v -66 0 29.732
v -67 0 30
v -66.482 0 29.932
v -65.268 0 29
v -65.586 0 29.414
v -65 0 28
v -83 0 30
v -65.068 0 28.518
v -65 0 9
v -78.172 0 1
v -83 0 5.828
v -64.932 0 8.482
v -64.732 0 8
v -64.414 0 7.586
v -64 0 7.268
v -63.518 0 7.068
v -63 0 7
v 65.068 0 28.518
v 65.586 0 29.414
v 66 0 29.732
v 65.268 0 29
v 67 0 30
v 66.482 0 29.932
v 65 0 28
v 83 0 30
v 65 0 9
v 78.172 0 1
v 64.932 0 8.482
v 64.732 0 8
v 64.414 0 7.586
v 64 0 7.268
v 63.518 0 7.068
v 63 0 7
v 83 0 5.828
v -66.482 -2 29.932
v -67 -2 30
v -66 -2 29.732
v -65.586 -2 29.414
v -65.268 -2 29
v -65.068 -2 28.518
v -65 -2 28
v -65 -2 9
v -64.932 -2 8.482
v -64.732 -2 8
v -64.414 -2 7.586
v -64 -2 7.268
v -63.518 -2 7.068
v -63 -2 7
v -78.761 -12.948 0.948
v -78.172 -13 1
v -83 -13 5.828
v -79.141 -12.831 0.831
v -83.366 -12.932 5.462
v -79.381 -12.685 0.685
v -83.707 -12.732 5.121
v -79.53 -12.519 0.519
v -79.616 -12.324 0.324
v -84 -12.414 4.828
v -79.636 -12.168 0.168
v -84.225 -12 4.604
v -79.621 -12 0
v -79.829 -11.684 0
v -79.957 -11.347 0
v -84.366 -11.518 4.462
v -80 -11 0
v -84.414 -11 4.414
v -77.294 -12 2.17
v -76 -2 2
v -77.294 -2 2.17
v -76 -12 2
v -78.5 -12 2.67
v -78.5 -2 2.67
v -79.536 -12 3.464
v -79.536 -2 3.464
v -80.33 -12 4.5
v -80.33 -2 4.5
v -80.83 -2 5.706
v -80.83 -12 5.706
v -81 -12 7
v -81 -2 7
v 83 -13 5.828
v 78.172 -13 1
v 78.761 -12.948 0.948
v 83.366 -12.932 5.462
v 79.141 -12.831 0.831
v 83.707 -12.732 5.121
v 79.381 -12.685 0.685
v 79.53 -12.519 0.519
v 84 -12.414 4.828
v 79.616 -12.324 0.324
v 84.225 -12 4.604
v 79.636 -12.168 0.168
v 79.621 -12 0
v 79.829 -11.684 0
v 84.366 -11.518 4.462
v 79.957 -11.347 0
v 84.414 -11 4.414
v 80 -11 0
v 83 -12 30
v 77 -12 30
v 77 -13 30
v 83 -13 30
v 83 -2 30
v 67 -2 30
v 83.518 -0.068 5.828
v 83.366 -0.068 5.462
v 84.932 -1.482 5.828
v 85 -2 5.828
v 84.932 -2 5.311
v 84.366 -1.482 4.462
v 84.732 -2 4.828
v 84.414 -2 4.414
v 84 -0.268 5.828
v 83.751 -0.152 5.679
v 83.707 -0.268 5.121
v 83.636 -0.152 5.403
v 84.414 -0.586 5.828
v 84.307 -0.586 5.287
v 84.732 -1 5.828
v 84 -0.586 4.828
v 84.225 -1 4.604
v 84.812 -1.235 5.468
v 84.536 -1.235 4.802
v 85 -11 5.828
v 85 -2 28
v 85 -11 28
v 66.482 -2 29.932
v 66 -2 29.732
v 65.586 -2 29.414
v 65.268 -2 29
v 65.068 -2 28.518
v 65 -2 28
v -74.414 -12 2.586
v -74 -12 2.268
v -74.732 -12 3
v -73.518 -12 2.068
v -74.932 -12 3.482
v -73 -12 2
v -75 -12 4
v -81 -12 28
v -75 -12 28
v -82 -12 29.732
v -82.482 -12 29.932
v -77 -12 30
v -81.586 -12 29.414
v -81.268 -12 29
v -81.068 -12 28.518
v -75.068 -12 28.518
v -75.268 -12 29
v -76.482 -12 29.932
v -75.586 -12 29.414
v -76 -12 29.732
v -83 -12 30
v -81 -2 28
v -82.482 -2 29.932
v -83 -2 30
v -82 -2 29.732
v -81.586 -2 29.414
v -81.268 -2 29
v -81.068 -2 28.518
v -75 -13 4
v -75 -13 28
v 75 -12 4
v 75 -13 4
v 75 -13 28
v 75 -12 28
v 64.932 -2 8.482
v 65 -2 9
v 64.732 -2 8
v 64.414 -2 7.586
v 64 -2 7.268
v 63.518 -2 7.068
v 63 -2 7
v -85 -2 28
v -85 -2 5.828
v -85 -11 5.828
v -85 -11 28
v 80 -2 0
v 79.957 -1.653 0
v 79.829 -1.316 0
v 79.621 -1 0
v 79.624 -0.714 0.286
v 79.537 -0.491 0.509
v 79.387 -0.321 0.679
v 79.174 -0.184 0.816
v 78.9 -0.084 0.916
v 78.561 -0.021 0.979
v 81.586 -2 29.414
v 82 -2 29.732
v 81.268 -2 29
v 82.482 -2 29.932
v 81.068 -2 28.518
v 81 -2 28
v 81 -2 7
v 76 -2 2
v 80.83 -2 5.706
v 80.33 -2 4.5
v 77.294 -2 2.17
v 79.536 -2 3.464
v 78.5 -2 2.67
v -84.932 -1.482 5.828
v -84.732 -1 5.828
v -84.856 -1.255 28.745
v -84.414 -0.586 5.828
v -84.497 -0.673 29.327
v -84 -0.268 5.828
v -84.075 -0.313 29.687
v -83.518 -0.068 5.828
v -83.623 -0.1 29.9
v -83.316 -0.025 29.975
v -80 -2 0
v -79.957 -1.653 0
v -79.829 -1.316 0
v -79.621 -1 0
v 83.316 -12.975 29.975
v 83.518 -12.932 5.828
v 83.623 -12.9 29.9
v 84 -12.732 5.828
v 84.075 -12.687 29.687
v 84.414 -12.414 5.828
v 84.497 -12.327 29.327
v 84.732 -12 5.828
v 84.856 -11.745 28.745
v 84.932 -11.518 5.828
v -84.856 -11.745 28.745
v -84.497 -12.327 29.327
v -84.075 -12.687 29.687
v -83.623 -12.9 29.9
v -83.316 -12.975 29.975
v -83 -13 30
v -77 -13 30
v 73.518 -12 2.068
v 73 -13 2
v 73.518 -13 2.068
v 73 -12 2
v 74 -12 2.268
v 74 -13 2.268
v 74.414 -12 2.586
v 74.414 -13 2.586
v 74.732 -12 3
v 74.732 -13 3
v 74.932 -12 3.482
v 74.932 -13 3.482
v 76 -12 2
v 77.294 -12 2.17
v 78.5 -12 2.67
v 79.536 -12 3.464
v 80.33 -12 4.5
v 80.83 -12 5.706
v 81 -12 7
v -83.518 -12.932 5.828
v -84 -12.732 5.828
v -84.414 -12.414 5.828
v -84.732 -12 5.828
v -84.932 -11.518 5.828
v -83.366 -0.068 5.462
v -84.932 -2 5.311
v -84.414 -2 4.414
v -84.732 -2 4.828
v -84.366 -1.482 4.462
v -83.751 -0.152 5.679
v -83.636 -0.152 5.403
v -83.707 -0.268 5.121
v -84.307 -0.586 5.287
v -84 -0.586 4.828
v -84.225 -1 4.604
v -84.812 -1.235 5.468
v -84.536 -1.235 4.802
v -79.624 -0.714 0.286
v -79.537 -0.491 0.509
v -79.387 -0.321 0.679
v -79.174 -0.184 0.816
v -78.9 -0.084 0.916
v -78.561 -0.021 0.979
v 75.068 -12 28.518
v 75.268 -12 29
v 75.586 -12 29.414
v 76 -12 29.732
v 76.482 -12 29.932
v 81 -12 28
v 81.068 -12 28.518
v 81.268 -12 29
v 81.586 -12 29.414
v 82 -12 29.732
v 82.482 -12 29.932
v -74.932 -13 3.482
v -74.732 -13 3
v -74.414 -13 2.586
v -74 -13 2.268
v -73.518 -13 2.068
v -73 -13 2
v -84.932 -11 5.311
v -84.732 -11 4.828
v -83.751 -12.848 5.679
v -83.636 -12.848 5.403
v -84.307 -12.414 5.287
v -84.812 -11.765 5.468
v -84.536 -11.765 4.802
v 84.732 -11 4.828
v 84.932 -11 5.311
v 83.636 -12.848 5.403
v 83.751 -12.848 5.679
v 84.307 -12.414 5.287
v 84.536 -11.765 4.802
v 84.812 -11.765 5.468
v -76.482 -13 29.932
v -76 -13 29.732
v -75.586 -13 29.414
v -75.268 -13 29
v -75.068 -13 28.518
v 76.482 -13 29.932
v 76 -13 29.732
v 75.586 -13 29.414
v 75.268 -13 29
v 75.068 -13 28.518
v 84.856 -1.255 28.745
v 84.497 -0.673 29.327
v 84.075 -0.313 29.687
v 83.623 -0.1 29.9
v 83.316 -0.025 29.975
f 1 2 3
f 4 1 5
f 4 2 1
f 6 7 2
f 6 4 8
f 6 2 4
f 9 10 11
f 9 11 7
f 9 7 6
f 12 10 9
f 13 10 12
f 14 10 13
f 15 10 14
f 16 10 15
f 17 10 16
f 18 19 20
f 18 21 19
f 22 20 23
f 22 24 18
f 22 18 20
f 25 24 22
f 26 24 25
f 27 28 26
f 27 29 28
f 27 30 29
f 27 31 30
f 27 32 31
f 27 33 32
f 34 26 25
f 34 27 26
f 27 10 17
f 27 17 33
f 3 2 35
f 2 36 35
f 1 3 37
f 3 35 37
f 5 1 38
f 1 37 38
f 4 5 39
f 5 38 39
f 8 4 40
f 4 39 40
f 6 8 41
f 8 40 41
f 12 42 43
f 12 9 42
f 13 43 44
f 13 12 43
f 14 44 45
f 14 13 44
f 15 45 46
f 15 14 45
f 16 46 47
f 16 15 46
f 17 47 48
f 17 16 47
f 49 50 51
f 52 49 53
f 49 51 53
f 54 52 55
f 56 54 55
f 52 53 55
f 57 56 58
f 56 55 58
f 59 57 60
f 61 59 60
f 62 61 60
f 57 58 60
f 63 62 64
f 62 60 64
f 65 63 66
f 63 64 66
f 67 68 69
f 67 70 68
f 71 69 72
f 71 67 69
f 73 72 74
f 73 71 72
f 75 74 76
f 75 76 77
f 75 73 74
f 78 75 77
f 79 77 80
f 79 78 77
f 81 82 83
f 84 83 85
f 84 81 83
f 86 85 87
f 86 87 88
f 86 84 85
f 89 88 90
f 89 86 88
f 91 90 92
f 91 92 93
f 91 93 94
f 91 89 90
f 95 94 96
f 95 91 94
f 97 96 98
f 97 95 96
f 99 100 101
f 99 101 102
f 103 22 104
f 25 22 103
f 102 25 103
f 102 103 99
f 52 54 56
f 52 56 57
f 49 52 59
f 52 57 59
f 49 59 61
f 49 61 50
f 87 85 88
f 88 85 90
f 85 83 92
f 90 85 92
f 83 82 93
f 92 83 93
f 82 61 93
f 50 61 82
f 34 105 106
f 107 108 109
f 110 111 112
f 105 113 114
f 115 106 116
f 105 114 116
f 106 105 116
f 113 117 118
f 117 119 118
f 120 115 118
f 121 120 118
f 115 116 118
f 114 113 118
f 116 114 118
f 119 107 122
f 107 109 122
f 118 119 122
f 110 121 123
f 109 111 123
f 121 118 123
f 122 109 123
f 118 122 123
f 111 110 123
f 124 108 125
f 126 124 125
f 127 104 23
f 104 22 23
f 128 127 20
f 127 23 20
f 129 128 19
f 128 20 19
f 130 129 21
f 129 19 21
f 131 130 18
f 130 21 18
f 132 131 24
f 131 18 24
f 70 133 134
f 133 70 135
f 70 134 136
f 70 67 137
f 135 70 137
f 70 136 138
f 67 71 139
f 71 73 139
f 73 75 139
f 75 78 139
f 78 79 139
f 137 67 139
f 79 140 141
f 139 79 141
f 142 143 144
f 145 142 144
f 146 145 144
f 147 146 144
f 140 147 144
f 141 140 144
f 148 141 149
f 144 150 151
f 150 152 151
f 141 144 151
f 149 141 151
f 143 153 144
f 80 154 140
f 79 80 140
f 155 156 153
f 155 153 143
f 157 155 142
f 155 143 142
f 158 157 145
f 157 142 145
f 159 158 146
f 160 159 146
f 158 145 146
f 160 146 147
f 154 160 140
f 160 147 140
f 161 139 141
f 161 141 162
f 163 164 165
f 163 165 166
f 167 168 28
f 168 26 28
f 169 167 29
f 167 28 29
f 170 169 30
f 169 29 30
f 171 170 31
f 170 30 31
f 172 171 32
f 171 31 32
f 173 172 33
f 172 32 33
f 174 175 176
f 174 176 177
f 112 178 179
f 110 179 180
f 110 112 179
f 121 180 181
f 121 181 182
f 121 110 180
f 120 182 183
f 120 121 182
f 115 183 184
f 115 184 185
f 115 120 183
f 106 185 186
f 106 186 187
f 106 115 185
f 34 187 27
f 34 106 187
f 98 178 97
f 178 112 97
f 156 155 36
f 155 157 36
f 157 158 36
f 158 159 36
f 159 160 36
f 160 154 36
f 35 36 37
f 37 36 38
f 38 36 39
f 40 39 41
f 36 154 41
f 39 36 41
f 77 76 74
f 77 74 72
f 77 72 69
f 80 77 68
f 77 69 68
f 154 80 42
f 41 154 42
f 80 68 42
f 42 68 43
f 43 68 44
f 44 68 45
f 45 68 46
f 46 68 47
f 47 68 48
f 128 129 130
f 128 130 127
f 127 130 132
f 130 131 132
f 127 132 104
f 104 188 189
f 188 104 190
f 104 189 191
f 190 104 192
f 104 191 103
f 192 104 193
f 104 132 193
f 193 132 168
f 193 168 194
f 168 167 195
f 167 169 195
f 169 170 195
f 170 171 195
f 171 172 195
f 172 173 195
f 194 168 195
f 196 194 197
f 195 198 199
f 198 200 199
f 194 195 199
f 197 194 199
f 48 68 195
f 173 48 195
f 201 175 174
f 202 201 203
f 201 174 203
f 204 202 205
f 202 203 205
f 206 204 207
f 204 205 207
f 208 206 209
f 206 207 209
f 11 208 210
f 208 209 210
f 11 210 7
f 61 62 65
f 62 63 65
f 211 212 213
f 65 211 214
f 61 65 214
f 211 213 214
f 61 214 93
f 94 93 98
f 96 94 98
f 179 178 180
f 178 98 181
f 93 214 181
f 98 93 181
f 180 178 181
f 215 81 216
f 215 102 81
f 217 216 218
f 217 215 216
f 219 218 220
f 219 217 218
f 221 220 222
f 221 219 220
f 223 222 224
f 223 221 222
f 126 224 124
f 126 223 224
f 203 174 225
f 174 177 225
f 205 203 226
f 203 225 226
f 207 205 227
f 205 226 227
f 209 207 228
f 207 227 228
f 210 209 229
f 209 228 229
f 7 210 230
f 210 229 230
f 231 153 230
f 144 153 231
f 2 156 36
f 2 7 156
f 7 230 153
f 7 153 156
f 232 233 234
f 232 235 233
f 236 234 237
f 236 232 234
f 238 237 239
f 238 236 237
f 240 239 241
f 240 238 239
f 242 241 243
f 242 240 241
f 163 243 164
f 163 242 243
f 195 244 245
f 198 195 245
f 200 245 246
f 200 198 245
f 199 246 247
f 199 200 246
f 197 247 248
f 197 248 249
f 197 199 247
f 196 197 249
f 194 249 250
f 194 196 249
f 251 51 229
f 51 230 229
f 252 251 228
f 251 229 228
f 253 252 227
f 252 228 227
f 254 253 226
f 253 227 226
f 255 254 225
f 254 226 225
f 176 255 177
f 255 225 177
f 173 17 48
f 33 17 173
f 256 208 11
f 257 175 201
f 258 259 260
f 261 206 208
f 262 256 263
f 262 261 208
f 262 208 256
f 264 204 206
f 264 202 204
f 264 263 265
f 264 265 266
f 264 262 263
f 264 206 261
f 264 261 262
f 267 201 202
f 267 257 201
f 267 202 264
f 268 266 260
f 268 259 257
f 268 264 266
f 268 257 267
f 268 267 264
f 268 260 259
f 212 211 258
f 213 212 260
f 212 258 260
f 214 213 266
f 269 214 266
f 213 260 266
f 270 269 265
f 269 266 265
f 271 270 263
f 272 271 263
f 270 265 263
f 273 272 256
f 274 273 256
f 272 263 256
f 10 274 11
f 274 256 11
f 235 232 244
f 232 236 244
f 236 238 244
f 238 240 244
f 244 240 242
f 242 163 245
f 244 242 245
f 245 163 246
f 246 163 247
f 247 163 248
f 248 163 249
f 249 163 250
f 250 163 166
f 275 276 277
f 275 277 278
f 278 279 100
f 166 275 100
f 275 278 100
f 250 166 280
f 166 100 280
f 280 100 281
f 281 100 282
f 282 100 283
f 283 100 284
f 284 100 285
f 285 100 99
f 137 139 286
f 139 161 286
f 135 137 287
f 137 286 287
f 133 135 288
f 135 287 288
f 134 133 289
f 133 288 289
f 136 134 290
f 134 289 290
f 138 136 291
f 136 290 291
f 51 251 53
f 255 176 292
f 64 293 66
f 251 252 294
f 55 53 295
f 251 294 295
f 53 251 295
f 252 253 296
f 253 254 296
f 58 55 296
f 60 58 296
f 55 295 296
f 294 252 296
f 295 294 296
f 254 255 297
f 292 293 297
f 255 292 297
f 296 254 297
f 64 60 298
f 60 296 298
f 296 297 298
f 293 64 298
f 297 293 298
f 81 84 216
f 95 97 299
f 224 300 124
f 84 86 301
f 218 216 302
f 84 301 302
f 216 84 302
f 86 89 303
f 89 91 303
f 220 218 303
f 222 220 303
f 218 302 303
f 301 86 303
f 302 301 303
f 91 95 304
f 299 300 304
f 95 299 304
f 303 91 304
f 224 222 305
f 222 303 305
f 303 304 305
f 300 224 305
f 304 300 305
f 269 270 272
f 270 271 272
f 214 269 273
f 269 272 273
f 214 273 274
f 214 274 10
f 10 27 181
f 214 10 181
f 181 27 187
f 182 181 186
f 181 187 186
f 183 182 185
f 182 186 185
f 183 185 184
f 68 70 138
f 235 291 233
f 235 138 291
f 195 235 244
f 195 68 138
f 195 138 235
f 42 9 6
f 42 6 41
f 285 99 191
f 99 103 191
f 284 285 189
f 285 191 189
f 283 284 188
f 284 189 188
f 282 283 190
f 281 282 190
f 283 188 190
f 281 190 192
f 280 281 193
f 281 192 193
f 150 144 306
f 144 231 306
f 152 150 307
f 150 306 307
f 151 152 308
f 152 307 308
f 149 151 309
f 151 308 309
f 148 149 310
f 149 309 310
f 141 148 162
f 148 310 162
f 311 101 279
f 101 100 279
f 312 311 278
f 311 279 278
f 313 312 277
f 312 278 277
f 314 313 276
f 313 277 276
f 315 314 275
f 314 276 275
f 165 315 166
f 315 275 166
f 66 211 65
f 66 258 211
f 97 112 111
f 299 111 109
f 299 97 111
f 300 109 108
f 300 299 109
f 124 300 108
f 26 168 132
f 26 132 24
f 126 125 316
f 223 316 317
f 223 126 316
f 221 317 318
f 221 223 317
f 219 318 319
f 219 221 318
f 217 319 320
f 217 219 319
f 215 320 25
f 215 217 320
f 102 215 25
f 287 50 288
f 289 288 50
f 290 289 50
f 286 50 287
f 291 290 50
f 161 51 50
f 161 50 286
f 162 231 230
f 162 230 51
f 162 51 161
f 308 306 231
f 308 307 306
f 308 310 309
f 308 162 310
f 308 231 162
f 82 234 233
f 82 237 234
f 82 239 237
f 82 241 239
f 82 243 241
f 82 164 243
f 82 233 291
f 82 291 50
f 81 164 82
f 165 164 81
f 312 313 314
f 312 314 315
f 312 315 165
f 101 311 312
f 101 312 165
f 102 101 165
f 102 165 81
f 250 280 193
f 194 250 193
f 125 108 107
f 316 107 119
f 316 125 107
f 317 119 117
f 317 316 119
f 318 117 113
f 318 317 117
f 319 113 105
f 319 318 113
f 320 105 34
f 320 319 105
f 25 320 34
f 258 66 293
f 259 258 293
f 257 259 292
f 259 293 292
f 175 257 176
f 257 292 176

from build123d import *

# Parameters (mm, degrees)
F0_W     = 170
F0_H     = 30
F1_DEPTH = 13
F3_DEPTH = 28
F4_W     = 130
F4_H     = 2
F5_DEPTH = 5
F6_SIZE  = 5
F7_R     = 5
F8_SIZE  = 1
F9_R     = 1.99999


# Not quite as in the source:
# - a fillet or chamfer is up to 0.001 mm smaller than in the source, because OpenCascade refuses the exact size


with BuildPart() as f1:
    # F0 (on Front) → F1 (new body)
    with BuildSketch(Plane.XZ):
        with Locations((0, 15)):
            Rectangle(F0_W, F0_H)
    extrude(amount=F1_DEPTH)

    # F2 (on face) → F3 (cut)
    with BuildSketch(Plane.XY.offset(30)):
        Polygon((-65, -2), (-81, -2), (-81, -12), (-75, -12), (-75, -13), (75, -13), (75, -12), (81, -12), (81, -2), (65, -2), (65, 0), (-65, 0), align=None)
    extrude(amount=-F3_DEPTH, mode=Mode.SUBTRACT)

    # F4 (on face) → F5 (join)
    with BuildSketch(Plane.XY.offset(2)):
        with Locations((0, -1)):
            Rectangle(F4_W, F4_H)
    extrude(amount=F5_DEPTH)

    # F6
    f6_edges = [f1.edges().sort_by_distance(p)[0] for p in [
        (85, -6.5, 0),
        (-85, -6.5, 0),
    ]]
    chamfer(f6_edges, length=F6_SIZE)

    # F7
    f7_edges = [f1.edges().sort_by_distance(p)[0] for p in [
        (-81, -7, 2),
        (81, -7, 2),
    ]]
    fillet(f7_edges, radius=F7_R)

    # F8
    f8_edges = [f1.edges().sort_by_distance(p)[0] for p in [
        (0, -13, 0),
        (0, 0, 0),
    ]]
    chamfer(f8_edges, length=F8_SIZE)

    # F9 (radius 2 in the source; OpenCascade refuses exactly that, so slightly less here)
    f9_edges = [f1.edges().sort_by_distance(p)[0] for p in [
        (-85, -6.5, 5),
        (-85, -6.5, 30),
        (-81, -7, 30),
        (81, -7, 30),
        (85, -6.5, 30),
        (85, -6.5, 5),
        (65, -1, 7),
        (65, -1, 30),
        (75, -12.5, 2),
        (75, -12.5, 30),
        (-65, -1, 30),
        (-65, -1, 7),
        (-75, -12.5, 2),
        (-75, -12.5, 30),
        (85, 0, 17.5),
        (83, 0, 3),
        (83, -13, 3),
        (85, -13, 17.5),
        (-85, 0, 17.5),
        (-83, 0, 3),
        (-85, -13, 17.5),
        (-83, -13, 3),
    ]]
    fillet(f9_edges, radius=F9_R)


solid = f1.part
